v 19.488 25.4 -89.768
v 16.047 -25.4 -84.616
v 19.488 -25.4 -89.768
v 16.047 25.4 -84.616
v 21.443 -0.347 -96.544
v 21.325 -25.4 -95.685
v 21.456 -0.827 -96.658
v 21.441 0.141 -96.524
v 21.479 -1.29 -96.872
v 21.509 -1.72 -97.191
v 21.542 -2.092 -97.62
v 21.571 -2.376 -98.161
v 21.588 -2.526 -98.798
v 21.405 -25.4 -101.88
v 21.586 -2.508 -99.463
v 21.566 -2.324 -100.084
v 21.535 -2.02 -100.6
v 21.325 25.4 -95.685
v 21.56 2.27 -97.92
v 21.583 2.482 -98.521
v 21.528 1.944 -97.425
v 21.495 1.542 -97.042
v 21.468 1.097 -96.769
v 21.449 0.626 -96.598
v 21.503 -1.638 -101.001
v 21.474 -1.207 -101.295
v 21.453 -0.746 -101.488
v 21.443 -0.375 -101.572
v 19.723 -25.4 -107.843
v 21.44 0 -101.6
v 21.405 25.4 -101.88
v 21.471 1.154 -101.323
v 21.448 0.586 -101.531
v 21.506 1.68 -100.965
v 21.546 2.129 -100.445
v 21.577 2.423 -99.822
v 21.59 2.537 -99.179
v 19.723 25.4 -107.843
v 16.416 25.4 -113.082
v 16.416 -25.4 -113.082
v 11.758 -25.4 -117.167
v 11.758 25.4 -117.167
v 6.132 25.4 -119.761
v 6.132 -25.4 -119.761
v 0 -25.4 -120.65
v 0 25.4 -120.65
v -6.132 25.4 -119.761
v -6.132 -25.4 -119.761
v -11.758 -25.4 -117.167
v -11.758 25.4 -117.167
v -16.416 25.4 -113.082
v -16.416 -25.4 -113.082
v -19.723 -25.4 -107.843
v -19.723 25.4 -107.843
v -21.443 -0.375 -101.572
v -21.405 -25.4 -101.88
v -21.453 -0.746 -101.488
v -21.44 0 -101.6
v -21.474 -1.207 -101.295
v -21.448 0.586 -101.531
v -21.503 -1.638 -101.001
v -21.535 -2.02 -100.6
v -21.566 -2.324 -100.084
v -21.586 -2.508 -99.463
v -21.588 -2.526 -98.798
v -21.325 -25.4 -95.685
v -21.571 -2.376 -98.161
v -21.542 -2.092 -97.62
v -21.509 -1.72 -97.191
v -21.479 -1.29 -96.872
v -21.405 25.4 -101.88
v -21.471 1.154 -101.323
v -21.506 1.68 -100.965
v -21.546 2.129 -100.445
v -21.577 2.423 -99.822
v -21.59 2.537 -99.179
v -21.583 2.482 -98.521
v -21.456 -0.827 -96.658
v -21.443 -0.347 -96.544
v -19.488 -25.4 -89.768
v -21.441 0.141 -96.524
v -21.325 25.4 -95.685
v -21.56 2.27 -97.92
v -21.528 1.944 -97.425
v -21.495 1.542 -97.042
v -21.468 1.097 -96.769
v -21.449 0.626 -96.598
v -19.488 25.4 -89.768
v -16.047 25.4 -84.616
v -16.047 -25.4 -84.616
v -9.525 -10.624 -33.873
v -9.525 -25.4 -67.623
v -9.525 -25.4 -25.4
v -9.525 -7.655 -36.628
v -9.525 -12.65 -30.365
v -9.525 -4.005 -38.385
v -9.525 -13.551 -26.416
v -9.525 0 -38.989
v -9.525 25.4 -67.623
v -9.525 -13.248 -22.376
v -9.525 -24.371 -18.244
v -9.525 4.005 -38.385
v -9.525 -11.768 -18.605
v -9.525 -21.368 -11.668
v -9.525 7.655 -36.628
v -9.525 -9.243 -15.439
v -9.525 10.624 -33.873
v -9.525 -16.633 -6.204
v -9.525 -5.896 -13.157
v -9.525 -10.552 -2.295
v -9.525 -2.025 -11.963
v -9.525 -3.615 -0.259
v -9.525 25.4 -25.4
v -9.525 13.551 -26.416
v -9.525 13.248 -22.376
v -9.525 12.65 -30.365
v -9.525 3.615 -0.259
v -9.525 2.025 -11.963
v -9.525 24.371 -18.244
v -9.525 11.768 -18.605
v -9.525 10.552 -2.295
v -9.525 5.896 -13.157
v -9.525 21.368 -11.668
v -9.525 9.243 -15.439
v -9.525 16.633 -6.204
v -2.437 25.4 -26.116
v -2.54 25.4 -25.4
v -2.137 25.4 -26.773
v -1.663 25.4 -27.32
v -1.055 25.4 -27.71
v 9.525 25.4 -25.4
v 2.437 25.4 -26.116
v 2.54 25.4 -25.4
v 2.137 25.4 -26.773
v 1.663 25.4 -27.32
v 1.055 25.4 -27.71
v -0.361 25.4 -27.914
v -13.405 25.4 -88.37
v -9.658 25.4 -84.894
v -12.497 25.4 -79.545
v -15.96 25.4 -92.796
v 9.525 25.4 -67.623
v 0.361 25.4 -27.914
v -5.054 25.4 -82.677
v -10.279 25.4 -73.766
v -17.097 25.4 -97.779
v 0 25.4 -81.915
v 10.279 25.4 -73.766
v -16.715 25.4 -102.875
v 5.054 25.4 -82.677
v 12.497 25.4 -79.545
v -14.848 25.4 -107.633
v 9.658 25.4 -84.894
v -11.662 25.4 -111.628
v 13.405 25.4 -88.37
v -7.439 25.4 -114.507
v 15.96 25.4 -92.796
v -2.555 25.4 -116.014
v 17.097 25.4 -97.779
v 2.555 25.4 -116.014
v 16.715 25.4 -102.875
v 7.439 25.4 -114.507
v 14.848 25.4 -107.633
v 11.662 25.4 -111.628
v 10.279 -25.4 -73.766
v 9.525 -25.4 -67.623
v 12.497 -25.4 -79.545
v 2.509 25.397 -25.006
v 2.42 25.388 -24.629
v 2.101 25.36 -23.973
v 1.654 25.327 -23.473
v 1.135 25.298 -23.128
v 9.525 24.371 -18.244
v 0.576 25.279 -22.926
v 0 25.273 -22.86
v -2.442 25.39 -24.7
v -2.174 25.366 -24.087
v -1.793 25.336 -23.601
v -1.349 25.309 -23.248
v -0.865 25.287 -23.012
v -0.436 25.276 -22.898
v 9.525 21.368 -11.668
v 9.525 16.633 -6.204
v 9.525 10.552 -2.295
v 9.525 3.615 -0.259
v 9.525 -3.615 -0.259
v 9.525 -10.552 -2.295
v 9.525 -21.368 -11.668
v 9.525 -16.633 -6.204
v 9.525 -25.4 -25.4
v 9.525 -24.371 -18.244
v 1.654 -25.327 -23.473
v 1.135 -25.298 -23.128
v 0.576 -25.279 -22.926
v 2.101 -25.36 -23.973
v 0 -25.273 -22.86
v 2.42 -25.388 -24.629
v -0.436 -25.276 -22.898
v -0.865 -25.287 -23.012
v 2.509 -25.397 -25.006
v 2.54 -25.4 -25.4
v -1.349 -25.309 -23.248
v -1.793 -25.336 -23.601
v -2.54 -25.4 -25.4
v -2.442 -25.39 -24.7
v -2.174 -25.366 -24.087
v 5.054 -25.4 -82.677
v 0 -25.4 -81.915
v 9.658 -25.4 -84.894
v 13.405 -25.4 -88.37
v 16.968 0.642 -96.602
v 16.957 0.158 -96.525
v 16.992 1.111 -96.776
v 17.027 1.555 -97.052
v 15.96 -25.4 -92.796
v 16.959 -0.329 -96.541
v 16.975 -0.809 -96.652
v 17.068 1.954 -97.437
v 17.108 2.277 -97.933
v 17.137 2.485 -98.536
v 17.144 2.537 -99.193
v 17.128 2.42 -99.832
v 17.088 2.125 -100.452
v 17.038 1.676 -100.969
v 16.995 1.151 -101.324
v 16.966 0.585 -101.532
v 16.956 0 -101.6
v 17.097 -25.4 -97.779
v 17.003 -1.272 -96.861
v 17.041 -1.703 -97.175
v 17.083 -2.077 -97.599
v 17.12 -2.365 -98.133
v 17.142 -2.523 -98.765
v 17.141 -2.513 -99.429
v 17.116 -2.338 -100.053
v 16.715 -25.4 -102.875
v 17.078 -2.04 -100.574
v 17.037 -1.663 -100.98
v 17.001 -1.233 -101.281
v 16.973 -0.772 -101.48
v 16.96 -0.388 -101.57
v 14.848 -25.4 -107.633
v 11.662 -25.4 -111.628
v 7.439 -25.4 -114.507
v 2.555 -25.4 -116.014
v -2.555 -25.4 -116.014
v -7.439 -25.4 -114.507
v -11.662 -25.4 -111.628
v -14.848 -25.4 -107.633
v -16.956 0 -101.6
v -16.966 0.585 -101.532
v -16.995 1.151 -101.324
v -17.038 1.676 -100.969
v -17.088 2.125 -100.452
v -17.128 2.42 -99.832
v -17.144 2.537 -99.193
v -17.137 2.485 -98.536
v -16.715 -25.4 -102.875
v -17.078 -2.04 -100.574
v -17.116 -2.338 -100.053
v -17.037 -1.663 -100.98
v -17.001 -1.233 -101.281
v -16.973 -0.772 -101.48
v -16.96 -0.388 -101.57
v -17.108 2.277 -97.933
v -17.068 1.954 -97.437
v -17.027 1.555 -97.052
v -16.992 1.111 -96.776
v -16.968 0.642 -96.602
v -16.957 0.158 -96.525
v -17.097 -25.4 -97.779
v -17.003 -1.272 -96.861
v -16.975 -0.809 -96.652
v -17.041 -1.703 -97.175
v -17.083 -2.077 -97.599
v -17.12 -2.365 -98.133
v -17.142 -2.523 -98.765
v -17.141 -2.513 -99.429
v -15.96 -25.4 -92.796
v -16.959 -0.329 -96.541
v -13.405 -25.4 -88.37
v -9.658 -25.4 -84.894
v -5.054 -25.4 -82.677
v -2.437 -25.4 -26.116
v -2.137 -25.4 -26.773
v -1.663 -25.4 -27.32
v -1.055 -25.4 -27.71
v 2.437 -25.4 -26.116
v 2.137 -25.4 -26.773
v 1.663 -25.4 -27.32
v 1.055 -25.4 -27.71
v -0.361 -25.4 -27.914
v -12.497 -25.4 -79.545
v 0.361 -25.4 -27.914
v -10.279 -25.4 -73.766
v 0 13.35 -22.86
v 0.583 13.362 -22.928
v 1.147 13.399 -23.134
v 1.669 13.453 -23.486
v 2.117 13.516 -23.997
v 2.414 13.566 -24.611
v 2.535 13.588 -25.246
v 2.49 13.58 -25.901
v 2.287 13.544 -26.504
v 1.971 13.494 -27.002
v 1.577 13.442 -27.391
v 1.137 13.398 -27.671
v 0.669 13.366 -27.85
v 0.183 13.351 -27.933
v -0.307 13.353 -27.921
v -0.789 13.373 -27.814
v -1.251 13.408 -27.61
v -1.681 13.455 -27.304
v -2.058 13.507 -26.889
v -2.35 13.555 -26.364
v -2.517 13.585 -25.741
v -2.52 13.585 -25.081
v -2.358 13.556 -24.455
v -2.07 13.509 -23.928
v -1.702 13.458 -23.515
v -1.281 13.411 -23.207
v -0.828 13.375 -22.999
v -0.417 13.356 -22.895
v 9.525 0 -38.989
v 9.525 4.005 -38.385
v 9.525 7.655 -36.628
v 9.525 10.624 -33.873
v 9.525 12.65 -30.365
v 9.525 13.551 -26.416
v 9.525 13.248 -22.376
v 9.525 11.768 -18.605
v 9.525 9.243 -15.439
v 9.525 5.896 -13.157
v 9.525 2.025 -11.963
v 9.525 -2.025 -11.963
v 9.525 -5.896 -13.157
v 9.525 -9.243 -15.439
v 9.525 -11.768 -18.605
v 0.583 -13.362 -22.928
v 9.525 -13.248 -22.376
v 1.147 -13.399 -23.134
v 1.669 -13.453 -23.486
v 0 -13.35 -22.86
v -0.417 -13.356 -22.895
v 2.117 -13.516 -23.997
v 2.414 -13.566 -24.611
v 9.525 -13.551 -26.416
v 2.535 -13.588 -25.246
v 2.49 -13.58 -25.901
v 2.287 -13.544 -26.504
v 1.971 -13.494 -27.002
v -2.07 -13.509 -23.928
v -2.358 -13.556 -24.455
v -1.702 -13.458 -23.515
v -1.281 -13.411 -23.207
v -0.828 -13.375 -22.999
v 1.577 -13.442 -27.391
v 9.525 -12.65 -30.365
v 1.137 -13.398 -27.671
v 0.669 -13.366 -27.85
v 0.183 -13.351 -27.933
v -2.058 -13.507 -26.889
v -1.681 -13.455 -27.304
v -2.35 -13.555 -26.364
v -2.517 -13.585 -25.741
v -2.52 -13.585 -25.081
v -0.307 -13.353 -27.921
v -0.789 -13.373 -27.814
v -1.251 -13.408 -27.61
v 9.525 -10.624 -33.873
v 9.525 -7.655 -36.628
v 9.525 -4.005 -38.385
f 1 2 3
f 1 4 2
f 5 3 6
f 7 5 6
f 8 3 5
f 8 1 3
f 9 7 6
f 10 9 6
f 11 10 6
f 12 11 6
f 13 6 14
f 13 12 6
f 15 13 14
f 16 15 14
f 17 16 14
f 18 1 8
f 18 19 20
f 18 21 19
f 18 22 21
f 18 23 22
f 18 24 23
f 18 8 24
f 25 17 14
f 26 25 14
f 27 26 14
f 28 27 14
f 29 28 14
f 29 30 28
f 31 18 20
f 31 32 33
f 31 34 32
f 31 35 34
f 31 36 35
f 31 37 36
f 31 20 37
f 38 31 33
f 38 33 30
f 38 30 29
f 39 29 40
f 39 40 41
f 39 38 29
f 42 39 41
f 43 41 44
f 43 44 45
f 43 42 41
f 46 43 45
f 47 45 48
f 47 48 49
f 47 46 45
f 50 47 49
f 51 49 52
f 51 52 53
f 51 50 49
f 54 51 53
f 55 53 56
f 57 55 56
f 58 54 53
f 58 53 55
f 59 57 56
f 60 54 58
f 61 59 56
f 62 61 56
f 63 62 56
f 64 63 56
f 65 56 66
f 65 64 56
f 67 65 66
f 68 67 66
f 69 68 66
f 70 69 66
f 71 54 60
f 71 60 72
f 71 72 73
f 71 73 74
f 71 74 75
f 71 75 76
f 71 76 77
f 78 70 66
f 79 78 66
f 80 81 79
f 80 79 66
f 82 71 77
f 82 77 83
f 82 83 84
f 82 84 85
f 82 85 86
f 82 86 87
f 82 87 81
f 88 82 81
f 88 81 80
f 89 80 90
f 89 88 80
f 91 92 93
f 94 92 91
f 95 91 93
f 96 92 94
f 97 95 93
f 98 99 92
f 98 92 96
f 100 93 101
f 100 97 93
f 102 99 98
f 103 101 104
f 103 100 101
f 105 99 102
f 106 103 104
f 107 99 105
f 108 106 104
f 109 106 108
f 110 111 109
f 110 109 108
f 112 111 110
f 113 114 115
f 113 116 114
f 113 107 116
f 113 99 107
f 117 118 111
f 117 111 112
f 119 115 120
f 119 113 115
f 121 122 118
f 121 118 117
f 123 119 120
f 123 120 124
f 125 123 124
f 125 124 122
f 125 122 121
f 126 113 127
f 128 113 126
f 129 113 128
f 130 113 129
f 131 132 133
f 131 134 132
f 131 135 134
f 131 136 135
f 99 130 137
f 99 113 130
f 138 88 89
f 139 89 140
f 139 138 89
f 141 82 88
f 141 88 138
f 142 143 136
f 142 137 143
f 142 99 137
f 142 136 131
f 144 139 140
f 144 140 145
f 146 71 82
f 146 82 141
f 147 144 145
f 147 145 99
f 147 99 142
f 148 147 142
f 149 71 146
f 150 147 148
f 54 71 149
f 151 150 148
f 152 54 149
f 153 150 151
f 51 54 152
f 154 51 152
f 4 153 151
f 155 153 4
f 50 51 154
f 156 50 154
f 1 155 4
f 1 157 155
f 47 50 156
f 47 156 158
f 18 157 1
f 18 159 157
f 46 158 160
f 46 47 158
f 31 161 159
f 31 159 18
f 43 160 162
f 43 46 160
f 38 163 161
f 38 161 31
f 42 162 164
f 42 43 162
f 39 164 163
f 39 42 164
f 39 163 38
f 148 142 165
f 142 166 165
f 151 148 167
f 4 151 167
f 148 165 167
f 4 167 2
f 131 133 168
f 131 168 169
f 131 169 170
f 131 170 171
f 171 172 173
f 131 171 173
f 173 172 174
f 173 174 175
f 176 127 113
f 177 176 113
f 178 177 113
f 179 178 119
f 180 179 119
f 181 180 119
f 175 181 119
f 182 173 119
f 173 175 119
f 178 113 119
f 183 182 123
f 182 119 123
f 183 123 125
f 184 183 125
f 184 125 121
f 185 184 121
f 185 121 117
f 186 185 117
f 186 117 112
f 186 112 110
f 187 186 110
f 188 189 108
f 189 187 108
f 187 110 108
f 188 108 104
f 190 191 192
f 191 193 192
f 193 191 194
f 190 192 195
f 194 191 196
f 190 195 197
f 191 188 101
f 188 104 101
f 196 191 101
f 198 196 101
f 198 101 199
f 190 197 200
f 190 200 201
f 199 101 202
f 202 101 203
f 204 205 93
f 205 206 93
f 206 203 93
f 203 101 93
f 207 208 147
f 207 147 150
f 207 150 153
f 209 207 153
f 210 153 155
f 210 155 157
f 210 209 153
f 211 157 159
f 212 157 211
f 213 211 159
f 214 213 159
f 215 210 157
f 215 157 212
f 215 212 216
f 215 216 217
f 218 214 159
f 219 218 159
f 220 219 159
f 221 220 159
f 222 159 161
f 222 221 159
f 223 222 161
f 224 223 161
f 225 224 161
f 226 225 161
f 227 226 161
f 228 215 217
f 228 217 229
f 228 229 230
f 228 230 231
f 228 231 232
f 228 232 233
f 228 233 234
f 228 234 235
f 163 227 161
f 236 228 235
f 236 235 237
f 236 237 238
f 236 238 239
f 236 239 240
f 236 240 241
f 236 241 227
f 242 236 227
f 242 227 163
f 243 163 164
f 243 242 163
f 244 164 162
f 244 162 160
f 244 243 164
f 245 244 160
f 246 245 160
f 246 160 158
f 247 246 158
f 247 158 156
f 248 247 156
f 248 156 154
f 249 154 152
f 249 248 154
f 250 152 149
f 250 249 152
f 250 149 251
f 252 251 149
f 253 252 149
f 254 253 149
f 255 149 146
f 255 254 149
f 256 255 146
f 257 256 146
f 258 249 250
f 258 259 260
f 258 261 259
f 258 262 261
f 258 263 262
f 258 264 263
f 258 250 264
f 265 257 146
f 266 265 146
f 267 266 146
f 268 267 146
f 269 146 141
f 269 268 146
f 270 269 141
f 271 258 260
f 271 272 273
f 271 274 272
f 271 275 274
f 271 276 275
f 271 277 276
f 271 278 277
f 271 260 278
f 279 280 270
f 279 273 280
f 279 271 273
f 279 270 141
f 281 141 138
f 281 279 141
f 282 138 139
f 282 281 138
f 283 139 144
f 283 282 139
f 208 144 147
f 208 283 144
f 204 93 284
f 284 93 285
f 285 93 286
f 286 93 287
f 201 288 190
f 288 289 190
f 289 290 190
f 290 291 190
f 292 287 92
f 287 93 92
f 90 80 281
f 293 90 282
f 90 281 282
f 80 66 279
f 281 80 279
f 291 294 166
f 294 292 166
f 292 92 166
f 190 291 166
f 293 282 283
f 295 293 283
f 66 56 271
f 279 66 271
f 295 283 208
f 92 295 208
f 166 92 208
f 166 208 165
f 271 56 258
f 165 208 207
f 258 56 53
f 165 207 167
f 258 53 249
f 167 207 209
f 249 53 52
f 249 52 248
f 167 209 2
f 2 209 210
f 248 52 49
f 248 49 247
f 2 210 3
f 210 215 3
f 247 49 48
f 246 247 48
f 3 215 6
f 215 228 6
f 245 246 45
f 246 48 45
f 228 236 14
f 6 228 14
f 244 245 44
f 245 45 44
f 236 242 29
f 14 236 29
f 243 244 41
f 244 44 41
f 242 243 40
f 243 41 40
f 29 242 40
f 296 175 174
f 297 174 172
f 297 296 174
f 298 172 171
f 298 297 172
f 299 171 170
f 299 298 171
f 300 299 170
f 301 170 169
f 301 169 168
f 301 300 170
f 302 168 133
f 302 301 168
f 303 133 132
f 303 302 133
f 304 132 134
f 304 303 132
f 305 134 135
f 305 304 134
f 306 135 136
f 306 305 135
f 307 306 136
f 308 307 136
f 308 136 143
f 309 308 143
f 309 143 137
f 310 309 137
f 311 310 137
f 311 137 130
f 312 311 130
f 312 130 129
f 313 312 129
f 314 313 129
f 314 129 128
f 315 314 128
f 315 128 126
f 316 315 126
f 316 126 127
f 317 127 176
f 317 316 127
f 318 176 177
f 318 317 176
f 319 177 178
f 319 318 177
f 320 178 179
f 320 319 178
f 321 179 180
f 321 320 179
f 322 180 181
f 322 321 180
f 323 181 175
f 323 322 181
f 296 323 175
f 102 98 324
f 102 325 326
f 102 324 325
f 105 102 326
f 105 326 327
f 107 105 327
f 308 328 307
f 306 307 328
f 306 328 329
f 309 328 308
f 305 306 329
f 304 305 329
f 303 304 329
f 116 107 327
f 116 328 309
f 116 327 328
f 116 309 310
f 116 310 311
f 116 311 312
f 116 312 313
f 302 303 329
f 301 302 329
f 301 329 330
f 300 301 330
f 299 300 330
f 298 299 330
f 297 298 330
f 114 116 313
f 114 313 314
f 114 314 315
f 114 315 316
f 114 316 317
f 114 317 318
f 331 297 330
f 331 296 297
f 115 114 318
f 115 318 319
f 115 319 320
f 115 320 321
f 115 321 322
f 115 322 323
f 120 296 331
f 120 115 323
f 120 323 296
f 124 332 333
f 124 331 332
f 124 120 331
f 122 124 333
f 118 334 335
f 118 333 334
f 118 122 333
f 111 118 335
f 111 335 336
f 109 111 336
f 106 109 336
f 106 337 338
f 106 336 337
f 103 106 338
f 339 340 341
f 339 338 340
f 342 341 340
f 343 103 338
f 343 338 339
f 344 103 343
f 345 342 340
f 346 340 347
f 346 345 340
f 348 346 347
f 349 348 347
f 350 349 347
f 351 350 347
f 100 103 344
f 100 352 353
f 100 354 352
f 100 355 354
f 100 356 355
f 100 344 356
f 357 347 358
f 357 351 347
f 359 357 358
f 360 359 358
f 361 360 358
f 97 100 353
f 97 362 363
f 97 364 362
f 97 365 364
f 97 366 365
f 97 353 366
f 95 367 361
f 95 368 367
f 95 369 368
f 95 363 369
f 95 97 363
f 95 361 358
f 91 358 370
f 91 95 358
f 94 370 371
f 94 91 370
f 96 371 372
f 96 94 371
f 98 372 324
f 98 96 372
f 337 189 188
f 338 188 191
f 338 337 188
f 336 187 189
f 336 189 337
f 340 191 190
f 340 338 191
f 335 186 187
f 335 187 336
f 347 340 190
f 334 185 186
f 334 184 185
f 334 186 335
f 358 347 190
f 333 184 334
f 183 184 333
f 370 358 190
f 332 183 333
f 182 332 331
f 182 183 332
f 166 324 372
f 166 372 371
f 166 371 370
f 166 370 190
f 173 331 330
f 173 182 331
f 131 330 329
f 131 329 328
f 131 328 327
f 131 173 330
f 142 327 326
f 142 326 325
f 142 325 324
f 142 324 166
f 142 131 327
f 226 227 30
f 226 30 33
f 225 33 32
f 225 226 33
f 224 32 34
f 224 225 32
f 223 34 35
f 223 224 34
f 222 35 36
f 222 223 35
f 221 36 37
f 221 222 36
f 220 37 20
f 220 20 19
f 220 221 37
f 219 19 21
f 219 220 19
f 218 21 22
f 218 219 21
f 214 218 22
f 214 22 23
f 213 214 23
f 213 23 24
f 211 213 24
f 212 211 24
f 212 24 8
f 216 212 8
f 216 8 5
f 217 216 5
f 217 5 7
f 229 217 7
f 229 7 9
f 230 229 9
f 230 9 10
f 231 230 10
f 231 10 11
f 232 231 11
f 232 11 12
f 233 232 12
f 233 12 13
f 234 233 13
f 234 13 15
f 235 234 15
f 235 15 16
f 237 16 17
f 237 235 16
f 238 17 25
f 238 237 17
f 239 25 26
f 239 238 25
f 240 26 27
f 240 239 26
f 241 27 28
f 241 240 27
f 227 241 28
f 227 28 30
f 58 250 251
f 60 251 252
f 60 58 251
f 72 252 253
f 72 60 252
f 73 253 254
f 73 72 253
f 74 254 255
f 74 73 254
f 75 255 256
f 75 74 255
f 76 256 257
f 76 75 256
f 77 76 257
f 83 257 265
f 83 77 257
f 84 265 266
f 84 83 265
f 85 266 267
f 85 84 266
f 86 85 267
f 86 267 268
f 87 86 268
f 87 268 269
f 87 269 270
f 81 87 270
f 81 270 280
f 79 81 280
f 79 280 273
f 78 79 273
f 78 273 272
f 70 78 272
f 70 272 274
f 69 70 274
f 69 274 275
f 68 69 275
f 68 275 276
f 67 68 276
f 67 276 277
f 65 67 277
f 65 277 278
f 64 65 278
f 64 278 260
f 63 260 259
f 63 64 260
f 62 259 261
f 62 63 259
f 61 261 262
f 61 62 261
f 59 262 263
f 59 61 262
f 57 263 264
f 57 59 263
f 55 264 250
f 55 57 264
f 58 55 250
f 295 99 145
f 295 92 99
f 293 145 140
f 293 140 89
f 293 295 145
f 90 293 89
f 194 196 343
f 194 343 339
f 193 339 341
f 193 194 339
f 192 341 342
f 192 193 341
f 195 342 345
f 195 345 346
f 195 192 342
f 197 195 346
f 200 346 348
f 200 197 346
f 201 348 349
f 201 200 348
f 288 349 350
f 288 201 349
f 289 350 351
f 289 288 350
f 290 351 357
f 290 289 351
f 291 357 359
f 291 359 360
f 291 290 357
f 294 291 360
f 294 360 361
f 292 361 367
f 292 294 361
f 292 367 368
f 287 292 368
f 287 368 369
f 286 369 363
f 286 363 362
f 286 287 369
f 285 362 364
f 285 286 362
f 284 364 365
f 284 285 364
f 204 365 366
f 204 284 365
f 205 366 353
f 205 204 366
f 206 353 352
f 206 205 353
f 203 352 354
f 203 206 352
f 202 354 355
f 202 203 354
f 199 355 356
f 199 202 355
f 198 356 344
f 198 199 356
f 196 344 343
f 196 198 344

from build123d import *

# Parameters (mm, degrees)
SKETCH1_R               = 17.145
SKETCH1_R_2             = 2.54
BOSS_EXTRUDE1_DEPTH     = 25.4
CUT_EXTRUDE1_DEPTH      = 128.160236415
CUT_EXTRUDE1_DEPTH_BACK = 128.160236415
SKETCH2_R               = 13.589
SKETCH2_R_2             = 2.54
FILLET1_R               = 25.4
FILLET2_R               = 25.4


with BuildPart() as part:
    # Sketch1 → Boss-Extrude1 (new, symmetric)
    with BuildSketch(Plane(origin=(0, 0, 0), x_dir=(1, 0, 0), z_dir=(0, 1, 0))):
        with BuildLine():
            Line((-9.525, 79.684694196), (-9.525, 0))
            Line((-9.525, 0), (9.525, 0))
            Line((9.525, 0), (9.525, 79.684694196))
            ThreePointArc((9.525, 79.684694196), (0, 120.65), (-9.525, 79.684694196))
        make_face()
        with Locations(Location((0, 99.06, 0), (0, 0, 270))):
            Circle(SKETCH1_R, mode=Mode.SUBTRACT)
        with Locations(Location((0, 25.4, 0), (0, 0, 270))):
            Circle(SKETCH1_R_2, mode=Mode.SUBTRACT)
    extrude(amount=BOSS_EXTRUDE1_DEPTH, both=True)

    # Sketch2 → Cut-Extrude1 (cut, two sides: drawn at the far end of the back side and taken through both)
    with BuildSketch(Plane(origin=(9.525, 0, 0), x_dir=(0, 0, -1), z_dir=(1, 0, 0)).offset(-CUT_EXTRUDE1_DEPTH_BACK)):
        with Locations((25.4, 0)):
            Circle(SKETCH2_R)
        with Locations((99.06, 0)):
            Circle(SKETCH2_R_2)
    extrude(amount=CUT_EXTRUDE1_DEPTH + CUT_EXTRUDE1_DEPTH_BACK, mode=Mode.SUBTRACT)

    # Fillet1
    # the kernel refuses this fillet: 25.4 mm, written as the material it takes off along each edge
    with BuildSketch(Plane(origin=(-73.025, -25.4, 0), x_dir=(0, 0, -1), z_dir=(1, 0, 0)), Plane(origin=(-73.025, 25.4, 0), x_dir=(0, -1, 0), z_dir=(1, 0, 0))) as fillet1_piece_1:
        with BuildLine():
            CenterArc((FILLET1_R, FILLET1_R), FILLET1_R, 180, 90)
            Line((0, FILLET1_R), (0, 0))
            Line((0, 0), (FILLET1_R, 0))
        make_face()
    extrude(amount=146.05, mode=Mode.SUBTRACT)

    # Fillet2
    fillet2_edges = [part.edges().sort_by_distance(p)[0] for p in [
        (9.525, 0, -79.684694196),
        (-9.525, 0, -79.684694196),
    ]]
    fillet(fillet2_edges, radius=FILLET2_R)


solid = part.part
